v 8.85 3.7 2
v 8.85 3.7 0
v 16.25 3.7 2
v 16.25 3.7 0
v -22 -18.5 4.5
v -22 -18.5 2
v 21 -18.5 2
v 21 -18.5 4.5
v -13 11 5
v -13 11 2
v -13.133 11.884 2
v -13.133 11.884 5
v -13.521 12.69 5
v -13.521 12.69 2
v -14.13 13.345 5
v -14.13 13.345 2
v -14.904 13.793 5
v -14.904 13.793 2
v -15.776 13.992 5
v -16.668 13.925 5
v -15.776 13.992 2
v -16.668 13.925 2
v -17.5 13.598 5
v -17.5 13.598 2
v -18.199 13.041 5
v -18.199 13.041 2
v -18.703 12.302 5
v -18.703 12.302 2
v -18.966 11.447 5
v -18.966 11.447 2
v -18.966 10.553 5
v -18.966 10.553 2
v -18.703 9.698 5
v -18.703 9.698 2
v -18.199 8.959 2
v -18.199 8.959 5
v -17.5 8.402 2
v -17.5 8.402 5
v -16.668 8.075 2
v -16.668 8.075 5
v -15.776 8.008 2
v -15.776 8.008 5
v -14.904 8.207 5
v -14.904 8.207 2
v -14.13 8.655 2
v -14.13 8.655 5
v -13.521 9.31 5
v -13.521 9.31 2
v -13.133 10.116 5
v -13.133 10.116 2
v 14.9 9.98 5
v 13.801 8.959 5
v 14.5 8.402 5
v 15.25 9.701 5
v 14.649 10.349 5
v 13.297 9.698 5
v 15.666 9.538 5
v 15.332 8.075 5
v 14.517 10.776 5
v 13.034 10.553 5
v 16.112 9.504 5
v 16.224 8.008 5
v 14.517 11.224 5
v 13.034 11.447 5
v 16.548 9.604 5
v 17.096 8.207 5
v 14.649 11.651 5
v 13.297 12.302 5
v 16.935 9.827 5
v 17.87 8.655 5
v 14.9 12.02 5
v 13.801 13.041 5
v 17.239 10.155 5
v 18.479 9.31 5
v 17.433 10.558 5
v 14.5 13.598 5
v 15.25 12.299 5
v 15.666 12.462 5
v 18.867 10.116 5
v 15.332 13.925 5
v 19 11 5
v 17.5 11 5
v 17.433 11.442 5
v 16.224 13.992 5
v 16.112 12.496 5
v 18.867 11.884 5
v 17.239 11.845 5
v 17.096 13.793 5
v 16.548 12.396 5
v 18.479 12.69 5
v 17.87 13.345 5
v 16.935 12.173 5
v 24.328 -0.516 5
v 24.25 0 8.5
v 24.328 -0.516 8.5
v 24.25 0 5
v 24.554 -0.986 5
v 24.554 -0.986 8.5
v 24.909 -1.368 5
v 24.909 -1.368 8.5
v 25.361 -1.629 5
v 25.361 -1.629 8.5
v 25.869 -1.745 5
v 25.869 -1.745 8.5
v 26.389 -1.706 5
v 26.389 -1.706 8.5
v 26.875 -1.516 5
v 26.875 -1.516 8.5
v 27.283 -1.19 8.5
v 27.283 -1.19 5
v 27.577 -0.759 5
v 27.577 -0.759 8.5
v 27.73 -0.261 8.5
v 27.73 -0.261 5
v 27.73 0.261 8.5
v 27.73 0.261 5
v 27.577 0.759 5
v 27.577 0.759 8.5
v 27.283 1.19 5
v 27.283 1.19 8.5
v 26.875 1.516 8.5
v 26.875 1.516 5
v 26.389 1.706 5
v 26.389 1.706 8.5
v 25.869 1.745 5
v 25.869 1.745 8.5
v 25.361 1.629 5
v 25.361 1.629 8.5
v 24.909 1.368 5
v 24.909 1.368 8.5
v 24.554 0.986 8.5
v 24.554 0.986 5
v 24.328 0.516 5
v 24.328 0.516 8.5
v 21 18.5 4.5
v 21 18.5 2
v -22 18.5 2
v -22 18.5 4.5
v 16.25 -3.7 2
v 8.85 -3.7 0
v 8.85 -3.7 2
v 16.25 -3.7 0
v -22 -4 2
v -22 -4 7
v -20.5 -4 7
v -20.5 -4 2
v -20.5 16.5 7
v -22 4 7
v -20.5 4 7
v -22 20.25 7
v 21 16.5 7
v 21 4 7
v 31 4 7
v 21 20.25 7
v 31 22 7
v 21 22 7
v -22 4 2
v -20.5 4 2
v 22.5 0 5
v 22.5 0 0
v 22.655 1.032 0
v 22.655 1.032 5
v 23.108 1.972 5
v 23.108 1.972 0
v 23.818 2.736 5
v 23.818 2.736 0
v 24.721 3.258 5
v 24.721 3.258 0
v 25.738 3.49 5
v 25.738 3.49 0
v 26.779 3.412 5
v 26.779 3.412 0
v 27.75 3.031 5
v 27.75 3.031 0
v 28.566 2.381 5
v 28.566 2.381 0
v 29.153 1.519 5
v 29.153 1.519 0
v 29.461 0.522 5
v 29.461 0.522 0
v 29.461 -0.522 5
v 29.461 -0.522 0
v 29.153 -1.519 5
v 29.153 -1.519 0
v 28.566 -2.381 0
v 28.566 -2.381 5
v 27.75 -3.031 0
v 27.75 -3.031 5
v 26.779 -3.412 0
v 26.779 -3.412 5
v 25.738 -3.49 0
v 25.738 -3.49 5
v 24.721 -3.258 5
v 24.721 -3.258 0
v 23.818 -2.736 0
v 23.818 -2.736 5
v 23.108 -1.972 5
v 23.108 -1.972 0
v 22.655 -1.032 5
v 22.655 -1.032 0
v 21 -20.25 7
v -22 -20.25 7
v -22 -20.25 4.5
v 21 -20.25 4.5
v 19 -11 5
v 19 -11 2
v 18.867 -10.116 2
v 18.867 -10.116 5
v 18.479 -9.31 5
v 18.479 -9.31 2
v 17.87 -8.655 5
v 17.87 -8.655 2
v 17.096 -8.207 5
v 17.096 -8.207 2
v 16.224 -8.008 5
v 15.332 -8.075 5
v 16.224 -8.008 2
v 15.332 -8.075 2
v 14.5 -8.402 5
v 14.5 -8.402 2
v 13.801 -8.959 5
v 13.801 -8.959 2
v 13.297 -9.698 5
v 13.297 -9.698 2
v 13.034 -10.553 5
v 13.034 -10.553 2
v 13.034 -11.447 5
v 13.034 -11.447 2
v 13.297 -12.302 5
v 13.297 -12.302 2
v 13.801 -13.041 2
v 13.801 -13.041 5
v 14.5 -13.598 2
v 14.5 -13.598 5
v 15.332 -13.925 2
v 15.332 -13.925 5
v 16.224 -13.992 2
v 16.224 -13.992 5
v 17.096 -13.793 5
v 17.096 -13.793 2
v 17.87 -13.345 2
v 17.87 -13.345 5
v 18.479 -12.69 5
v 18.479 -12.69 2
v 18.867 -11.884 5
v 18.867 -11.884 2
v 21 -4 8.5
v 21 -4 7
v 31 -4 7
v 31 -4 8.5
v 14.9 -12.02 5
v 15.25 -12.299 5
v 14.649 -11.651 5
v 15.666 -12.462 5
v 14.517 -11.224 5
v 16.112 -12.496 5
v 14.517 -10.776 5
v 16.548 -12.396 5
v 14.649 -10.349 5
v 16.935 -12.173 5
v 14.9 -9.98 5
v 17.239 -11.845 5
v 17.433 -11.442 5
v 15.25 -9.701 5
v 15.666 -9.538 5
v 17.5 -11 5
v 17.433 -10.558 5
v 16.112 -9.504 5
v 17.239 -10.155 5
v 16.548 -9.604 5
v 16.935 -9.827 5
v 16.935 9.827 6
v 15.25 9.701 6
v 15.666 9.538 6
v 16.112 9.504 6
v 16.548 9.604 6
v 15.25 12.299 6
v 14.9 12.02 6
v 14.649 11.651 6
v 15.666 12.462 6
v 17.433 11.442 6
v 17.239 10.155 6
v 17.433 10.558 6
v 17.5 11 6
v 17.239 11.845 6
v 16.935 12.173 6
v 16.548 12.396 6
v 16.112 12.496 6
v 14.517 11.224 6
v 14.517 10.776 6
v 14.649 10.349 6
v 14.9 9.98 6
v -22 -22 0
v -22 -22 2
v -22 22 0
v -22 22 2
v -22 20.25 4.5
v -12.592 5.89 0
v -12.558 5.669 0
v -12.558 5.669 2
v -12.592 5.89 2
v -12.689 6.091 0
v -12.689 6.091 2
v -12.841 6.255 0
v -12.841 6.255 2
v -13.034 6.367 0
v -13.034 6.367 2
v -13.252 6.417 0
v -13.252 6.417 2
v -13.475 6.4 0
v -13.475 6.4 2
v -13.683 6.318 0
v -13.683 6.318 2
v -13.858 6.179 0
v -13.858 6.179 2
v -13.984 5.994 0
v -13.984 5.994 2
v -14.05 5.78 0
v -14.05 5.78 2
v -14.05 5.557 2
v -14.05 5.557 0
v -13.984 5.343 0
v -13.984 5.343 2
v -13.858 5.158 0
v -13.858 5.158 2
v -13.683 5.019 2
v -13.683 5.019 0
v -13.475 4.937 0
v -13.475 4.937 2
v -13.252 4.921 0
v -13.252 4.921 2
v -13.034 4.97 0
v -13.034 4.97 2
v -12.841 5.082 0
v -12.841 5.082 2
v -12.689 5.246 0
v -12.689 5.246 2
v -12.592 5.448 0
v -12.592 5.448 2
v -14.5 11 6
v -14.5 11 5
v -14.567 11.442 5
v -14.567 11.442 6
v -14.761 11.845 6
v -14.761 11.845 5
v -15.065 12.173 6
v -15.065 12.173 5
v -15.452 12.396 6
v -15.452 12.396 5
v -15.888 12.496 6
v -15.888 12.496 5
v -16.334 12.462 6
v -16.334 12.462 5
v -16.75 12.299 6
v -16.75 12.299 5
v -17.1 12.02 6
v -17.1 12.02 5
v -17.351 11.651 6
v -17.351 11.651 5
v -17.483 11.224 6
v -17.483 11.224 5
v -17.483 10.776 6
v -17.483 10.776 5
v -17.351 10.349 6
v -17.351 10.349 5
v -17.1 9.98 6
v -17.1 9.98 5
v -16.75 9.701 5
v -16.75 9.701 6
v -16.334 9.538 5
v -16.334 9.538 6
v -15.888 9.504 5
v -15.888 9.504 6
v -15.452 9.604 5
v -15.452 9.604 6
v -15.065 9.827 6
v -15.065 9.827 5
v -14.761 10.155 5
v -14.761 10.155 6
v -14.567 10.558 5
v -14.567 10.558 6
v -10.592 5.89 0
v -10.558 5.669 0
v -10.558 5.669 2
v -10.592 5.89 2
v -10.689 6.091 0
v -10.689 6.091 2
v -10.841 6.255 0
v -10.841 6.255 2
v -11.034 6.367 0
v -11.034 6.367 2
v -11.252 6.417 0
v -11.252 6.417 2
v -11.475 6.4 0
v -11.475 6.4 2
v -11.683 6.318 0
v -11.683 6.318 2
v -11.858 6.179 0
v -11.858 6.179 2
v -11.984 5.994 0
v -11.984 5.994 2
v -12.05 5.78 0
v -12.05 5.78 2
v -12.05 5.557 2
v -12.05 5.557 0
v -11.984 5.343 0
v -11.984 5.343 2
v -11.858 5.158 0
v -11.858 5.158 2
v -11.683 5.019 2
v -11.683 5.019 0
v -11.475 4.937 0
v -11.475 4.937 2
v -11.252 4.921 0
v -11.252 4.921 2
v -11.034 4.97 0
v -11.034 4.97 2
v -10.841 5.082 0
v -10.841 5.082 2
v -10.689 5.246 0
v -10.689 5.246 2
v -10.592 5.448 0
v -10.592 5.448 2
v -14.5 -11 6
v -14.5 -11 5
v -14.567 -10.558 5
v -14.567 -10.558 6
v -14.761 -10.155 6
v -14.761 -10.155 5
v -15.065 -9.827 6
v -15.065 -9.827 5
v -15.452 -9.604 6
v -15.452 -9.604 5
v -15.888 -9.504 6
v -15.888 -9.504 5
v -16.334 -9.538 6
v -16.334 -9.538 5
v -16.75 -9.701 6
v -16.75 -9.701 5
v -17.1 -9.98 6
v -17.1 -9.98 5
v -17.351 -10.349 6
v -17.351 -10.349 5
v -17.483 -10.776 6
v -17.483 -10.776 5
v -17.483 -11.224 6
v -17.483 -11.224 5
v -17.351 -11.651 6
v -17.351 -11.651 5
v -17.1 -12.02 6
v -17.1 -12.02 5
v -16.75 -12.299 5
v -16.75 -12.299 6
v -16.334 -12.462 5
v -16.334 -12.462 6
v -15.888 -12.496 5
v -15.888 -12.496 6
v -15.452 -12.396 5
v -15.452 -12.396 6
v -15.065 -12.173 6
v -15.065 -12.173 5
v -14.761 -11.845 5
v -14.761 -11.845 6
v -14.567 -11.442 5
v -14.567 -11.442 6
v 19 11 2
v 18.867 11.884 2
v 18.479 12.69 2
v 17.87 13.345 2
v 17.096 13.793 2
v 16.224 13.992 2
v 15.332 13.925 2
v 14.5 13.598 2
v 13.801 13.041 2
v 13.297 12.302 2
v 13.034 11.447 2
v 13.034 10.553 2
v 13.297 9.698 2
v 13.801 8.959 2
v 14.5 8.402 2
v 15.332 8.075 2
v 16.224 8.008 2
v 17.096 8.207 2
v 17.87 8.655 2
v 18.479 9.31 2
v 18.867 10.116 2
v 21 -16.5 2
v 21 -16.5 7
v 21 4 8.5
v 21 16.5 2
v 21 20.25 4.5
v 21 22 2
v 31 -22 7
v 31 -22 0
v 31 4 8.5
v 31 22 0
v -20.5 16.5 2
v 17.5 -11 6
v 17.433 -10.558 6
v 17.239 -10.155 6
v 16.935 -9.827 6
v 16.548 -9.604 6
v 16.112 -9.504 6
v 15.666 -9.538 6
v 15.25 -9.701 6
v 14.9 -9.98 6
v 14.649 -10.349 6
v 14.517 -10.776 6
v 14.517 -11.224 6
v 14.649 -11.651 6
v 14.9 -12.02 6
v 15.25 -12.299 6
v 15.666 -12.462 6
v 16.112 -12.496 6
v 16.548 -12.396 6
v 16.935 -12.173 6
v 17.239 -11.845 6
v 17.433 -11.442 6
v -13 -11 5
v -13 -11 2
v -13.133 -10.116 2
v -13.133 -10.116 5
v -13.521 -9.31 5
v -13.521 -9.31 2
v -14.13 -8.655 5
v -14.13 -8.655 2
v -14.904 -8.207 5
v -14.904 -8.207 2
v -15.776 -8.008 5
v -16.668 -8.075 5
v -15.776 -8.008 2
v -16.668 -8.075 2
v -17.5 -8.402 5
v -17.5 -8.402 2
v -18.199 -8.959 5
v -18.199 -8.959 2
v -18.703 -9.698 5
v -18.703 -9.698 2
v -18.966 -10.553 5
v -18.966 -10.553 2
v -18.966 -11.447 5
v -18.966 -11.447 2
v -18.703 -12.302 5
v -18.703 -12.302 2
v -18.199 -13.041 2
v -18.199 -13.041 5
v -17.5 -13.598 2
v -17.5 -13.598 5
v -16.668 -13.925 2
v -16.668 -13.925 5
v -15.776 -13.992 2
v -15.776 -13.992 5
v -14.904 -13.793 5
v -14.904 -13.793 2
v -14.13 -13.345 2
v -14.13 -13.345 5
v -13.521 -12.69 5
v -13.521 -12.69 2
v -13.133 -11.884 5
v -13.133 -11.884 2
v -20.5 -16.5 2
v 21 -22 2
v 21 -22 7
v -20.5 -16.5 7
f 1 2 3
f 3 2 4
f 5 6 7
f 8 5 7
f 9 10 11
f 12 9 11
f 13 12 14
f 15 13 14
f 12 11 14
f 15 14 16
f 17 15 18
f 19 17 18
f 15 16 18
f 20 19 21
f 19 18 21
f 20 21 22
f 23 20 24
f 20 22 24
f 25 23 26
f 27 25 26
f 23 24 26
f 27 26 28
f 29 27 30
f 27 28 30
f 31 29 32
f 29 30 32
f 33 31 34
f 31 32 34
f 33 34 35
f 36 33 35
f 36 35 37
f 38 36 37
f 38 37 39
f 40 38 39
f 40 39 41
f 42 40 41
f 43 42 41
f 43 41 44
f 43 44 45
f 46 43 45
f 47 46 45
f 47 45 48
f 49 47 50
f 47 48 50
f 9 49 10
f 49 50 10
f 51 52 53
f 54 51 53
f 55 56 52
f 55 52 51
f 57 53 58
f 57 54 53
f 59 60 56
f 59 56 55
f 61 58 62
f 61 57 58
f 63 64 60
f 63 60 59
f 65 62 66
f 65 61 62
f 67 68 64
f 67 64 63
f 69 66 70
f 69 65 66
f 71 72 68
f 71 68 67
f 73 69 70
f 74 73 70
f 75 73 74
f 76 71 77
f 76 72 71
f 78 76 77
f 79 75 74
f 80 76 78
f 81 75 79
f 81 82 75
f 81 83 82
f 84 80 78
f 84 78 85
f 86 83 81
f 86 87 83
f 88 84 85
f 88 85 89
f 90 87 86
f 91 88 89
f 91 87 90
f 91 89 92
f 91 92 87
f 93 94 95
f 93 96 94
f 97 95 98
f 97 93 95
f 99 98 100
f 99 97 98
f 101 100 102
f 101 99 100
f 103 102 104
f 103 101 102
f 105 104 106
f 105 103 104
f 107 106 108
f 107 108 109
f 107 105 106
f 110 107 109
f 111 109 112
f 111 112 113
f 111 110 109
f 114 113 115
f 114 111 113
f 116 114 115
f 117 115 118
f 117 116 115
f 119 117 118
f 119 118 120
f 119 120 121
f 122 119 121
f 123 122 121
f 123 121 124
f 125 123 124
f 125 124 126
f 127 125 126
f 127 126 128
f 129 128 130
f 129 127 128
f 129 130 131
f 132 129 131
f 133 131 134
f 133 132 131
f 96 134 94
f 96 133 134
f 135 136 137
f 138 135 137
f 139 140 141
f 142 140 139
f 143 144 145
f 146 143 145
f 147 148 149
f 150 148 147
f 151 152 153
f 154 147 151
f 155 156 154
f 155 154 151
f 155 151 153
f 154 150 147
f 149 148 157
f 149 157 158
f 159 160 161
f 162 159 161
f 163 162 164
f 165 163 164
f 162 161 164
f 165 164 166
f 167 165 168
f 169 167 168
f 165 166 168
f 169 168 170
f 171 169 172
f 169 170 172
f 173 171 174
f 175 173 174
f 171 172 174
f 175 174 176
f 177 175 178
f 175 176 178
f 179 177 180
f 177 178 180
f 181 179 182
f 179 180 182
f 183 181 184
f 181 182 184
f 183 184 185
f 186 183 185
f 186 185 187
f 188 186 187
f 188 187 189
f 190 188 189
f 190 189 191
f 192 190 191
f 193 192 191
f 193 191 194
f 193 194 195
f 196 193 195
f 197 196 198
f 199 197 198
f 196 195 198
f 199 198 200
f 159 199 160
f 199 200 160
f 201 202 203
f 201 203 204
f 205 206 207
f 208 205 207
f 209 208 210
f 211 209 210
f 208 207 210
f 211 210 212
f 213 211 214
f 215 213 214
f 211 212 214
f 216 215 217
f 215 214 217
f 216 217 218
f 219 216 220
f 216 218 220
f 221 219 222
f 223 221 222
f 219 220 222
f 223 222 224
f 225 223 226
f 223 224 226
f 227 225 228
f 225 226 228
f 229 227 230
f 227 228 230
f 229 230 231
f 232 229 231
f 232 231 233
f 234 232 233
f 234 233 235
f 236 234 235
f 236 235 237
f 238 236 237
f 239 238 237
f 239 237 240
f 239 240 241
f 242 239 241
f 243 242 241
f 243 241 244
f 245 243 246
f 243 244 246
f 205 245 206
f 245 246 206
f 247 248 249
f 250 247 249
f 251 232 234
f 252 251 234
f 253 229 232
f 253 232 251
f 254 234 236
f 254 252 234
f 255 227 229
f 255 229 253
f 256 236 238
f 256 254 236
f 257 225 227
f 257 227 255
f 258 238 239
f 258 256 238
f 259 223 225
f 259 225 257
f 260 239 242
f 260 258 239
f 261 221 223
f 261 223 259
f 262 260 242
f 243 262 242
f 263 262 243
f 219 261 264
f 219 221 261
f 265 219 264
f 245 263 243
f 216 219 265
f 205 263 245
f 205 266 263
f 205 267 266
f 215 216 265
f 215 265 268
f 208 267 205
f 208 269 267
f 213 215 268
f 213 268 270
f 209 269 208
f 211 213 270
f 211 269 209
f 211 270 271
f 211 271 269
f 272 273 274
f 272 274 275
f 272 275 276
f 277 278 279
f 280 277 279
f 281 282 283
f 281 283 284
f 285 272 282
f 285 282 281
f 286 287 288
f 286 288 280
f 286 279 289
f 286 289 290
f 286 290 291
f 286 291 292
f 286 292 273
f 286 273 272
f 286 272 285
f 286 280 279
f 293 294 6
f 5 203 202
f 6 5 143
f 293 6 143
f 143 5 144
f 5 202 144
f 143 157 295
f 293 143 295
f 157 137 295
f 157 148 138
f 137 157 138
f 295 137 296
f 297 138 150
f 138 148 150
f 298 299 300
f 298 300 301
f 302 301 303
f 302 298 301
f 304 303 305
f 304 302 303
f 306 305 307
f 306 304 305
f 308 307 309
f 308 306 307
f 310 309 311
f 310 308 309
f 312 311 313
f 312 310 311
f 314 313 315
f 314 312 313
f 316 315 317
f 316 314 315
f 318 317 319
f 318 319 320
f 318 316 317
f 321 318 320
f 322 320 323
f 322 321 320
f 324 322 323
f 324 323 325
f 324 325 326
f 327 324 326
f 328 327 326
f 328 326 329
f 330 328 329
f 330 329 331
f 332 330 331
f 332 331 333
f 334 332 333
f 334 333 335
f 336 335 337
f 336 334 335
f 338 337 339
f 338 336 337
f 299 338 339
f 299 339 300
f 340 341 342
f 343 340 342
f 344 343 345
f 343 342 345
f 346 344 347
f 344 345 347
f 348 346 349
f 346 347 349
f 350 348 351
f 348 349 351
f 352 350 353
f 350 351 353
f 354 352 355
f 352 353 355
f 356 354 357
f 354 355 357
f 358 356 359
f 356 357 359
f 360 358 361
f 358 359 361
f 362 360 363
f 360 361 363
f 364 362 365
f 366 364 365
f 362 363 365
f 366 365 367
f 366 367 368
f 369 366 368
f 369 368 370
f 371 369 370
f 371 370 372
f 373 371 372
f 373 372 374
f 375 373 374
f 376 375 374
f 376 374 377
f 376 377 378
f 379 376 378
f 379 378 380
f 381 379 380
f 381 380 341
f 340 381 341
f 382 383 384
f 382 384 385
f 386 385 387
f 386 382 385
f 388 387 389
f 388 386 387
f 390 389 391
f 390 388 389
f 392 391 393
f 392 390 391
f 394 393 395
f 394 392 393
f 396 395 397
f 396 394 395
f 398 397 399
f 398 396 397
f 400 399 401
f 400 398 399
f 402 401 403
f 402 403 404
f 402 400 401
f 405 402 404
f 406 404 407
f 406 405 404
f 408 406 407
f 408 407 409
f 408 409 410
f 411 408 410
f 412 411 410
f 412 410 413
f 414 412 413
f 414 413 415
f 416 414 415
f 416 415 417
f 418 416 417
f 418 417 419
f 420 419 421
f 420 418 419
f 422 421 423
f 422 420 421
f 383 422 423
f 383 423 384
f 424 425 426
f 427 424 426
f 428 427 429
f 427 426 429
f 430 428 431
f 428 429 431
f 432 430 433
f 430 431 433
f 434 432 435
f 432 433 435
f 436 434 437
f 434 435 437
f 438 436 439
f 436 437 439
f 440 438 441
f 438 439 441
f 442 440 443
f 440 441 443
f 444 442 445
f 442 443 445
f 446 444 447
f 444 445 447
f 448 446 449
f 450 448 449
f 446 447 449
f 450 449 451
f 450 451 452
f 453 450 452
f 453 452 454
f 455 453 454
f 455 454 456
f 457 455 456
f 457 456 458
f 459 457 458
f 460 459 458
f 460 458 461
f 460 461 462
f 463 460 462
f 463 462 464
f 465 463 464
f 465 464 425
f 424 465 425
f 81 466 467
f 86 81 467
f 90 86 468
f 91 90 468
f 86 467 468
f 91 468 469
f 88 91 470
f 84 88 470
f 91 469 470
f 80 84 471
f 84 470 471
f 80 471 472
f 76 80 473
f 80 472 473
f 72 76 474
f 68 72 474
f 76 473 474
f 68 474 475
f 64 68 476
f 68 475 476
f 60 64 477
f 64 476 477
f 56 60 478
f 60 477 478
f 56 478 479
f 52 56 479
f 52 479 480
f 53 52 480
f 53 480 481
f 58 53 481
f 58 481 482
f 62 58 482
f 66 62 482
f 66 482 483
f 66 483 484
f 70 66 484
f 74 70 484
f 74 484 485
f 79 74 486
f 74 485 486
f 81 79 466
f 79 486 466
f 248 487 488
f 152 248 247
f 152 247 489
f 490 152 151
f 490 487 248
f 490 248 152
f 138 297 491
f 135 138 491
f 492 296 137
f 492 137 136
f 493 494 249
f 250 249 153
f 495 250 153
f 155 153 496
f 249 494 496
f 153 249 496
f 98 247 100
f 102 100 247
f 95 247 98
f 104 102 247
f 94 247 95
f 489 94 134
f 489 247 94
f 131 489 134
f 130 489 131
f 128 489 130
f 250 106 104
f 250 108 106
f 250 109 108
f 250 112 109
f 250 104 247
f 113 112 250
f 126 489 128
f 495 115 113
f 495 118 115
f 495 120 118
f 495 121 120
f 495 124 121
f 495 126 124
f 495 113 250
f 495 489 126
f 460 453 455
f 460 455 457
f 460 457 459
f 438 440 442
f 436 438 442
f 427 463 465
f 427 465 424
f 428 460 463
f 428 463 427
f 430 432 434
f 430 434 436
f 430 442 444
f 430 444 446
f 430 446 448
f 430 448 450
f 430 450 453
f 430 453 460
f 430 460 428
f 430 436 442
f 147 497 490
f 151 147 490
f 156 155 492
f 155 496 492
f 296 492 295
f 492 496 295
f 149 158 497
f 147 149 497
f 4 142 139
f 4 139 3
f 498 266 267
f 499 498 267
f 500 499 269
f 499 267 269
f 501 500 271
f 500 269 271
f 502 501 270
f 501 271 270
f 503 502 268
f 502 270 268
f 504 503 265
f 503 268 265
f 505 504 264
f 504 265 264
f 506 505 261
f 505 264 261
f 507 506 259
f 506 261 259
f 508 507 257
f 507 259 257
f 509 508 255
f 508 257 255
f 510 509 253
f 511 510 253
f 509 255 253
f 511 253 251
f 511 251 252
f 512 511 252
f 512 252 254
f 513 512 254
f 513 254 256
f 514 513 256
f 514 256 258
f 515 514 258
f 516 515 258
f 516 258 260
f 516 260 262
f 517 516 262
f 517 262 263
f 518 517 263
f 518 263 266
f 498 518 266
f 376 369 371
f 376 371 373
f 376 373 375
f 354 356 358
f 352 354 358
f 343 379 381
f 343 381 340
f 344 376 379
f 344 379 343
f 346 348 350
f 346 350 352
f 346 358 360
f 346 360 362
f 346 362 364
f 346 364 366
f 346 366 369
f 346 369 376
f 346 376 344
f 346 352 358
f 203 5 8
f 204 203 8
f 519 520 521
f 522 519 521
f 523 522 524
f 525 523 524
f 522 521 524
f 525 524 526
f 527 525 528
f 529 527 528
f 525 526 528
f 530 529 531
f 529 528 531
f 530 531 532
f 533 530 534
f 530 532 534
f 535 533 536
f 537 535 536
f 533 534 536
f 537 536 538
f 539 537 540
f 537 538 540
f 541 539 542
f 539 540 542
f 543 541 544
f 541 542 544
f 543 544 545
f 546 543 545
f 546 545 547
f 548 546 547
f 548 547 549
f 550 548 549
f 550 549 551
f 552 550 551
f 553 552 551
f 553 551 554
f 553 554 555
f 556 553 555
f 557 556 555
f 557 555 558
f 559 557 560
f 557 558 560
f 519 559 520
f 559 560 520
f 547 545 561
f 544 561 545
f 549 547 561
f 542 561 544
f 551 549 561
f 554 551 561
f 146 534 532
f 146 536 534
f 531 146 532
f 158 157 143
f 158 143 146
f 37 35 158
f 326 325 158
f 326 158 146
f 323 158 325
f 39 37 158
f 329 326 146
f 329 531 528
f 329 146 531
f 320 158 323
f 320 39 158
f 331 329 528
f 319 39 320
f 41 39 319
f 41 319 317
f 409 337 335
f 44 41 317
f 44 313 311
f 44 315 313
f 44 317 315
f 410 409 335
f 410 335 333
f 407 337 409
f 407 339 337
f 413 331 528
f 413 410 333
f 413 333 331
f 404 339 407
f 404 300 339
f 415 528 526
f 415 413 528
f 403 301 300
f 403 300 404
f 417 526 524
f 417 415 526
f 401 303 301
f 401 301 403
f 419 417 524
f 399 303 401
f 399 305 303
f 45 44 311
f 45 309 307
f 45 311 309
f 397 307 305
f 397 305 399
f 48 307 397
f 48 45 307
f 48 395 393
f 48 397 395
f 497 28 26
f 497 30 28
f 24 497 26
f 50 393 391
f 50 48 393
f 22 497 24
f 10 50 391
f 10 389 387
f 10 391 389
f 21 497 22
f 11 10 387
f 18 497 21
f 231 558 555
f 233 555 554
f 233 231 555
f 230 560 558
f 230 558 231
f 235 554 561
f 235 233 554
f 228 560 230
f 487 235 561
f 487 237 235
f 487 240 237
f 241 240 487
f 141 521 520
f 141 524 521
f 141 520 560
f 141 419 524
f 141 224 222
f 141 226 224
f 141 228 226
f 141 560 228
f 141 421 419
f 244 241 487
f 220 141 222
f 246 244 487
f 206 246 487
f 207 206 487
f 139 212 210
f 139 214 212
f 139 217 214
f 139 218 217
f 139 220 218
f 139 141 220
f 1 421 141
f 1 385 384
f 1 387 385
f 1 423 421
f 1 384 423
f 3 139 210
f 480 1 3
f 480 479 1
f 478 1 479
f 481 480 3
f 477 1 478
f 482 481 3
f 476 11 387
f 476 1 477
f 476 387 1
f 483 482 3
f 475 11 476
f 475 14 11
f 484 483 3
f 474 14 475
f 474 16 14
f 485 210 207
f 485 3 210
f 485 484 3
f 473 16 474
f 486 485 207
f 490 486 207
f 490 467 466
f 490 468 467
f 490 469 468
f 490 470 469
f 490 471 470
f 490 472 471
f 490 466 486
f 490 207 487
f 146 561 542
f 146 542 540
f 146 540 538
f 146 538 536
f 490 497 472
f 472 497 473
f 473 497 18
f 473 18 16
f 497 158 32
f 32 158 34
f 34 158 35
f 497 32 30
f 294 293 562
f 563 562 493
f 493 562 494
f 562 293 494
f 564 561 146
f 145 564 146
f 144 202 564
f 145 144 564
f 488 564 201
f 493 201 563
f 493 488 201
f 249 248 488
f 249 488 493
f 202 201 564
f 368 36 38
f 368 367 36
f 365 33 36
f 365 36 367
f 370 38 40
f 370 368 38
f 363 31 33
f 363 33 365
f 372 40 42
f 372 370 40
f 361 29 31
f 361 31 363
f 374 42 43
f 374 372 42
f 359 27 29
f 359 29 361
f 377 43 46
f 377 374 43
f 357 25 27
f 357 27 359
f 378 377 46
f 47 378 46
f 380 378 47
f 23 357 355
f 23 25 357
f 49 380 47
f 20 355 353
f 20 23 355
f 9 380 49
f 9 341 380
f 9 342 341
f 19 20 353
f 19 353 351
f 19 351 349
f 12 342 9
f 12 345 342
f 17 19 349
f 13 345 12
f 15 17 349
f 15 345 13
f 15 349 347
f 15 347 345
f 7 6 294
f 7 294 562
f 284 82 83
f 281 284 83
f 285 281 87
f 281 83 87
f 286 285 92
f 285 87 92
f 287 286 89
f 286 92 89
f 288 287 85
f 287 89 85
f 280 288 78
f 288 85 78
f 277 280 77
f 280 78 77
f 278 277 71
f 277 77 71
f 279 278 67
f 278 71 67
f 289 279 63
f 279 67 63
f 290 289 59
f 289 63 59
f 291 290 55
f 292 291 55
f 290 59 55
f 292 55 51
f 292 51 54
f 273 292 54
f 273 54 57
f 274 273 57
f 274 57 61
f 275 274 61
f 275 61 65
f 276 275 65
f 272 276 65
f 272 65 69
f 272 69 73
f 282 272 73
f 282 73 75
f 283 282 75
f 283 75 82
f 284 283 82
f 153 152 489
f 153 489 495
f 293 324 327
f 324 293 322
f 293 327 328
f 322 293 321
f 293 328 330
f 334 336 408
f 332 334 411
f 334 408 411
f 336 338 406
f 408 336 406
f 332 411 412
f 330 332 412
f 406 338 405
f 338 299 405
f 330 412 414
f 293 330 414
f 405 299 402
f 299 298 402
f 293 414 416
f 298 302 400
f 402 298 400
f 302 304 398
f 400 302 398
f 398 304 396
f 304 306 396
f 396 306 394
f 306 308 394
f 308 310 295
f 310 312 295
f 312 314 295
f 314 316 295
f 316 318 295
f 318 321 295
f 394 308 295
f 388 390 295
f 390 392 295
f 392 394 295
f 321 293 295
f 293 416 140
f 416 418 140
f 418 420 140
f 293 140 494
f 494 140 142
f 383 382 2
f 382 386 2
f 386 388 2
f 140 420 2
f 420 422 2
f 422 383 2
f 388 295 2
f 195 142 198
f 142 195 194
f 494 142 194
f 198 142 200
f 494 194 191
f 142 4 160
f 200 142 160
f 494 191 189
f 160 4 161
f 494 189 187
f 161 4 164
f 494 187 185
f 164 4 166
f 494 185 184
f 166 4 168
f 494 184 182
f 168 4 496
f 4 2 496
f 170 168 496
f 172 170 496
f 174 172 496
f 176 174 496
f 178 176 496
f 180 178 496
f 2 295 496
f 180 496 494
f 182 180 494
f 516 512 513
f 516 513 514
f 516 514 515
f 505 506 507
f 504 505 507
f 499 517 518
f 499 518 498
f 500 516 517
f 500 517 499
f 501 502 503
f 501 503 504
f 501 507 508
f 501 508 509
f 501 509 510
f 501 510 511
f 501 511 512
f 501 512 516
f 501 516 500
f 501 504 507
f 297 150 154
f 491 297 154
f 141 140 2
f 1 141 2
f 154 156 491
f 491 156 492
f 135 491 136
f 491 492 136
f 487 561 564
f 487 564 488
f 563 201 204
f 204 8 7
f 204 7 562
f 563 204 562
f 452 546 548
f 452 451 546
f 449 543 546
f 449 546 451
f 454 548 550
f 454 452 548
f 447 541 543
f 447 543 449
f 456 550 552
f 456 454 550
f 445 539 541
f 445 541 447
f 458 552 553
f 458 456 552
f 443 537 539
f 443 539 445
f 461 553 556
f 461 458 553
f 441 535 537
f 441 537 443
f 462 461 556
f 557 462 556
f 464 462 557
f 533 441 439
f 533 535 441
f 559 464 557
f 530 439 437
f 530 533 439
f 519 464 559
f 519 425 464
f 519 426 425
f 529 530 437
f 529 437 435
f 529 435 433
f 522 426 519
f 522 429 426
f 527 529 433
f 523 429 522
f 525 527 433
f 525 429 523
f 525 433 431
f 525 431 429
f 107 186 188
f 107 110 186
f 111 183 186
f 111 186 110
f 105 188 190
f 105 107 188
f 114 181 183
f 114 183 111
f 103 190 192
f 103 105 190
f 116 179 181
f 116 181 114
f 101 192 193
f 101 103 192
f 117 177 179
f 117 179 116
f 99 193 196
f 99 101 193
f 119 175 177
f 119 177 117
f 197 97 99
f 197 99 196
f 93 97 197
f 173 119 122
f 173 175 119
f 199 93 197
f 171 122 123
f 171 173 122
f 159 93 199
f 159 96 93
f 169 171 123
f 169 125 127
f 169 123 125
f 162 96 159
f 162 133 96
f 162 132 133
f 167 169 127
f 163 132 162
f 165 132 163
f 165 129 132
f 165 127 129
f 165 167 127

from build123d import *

# Parameters (mm, degrees)
CROQUIS1_W              = 53
CROQUIS1_H              = 44
CROQUIS1_R              = 0.75
CROQUIS1_W_2            = 7.4
CROQUIS1_H_2            = 7.4
SALIENTE_EXTRUIR1_DEPTH = 2
CROQUIS4_R              = 1.5
SALIENTE_EXTRUIR3_DEPTH = 4
CORTAR_EXTRUIR1_REACH   = 40.484
CROQUIS5_R              = 1.75
CROQUIS6_R              = 1.75
CROQUIS6_W              = 41.5
CROQUIS6_H              = 33
SALIENTE_EXTRUIR4_DEPTH = 5
CROQUIS7_W              = 43
CROQUIS7_H              = 1.75
SALIENTE_EXTRUIR5_DEPTH = 2.5
CROQUIS8_W              = 1.5
CROQUIS8_H              = 8
CORTAR_EXTRUIR3_DEPTH   = 5
CROQUIS9_R              = 3.5
CORTAR_EXTRUIR4_DEPTH   = 5
CROQUIS10_R             = 3
SALIENTE_EXTRUIR6_DEPTH = 3
CROQUIS12_W             = 10
CROQUIS12_H             = 8
CROQUIS12_R             = 1.75
SALIENTE_EXTRUIR7_DEPTH = 1.5


with BuildPart() as part:
    # Croquis1 → Saliente-Extruir1 (new body)
    with BuildSketch(Plane.XY):
        with Locations((4.5, 0)):
            Rectangle(CROQUIS1_W, CROQUIS1_H)
        with Locations((-13.3084, 5.6686)):
            Circle(CROQUIS1_R, mode=Mode.SUBTRACT)
        with Locations((-11.3084, 5.6686)):
            Circle(CROQUIS1_R, mode=Mode.SUBTRACT)
        with Locations((12.55, 0)):
            Rectangle(CROQUIS1_W_2, CROQUIS1_H_2, mode=Mode.SUBTRACT)
    extrude(amount=SALIENTE_EXTRUIR1_DEPTH)

    # Croquis4 → Saliente-Extruir3 (add)
    with BuildSketch(Plane.XY.offset(2)):
        with Locations((-16, -11)):
            Circle(CROQUIS4_R)
        with Locations((16, -11)):
            Circle(CROQUIS4_R)
        with Locations((16, 11)):
            Circle(CROQUIS4_R)
        with Locations((-16, 11)):
            Circle(CROQUIS4_R)
    extrude(amount=SALIENTE_EXTRUIR3_DEPTH)

    # Croquis5 → Cortar-Extruir1 (cut, up to next)
    with BuildSketch(Plane(origin=(0, 0, 0), x_dir=(-1, 0, 0), z_dir=(0, 0, -1)), mode=Mode.PRIVATE) as cortar_extruir1_sk1:
        with Locations((-26, 0)):
            Circle(CROQUIS5_R)
    cortar_extruir1_tool1 = extrude(cortar_extruir1_sk1.sketch, amount=-CORTAR_EXTRUIR1_REACH, mode=Mode.PRIVATE) & part.part
    add(cortar_extruir1_tool1.solids().sort_by_distance((26, 0, 0))[0], mode=Mode.SUBTRACT)

    # Croquis6 → Saliente-Extruir4 (add)
    with BuildSketch(Plane.XY.offset(2)):
        Polygon((-22, -18.5), (21, -18.5), (21, -22), (31, -22), (31, 22), (21, 22), (21, 18.5), (-22, 18.5), align=None)
        with Locations(Location((26, 0, 0), (0, 0, 180))):
            Circle(CROQUIS6_R, mode=Mode.SUBTRACT)
        with Locations((0.25, 0)):
            Rectangle(CROQUIS6_W, CROQUIS6_H, mode=Mode.SUBTRACT)
    extrude(amount=SALIENTE_EXTRUIR4_DEPTH)

    # Croquis7 → Saliente-Extruir5 (add)
    with BuildSketch(Plane.XY.offset(7)):
        with Locations((-0.5, 19.375)):
            Rectangle(CROQUIS7_W, CROQUIS7_H)
        with Locations((-0.5, -19.375)):
            Rectangle(CROQUIS7_W, CROQUIS7_H)
    extrude(amount=-SALIENTE_EXTRUIR5_DEPTH)

    # Croquis8 → Cortar-Extruir3 (cut)
    with BuildSketch(Plane.XY.offset(7)):
        with Locations((-21.25, 0)):
            Rectangle(CROQUIS8_W, CROQUIS8_H)
    extrude(amount=-CORTAR_EXTRUIR3_DEPTH, mode=Mode.SUBTRACT)

    # Croquis9 → Cortar-Extruir4 (cut)
    with BuildSketch(Plane(origin=(0, 0, 0), x_dir=(-1, 0, 0), z_dir=(0, 0, -1))):
        with Locations((-26, 0)):
            Circle(CROQUIS9_R)
    extrude(amount=-CORTAR_EXTRUIR4_DEPTH, mode=Mode.SUBTRACT)

    # Croquis10 → Saliente-Extruir6 (add)
    with BuildSketch(Plane.XY.offset(2)):
        with Locations((-16, 11)):
            Circle(CROQUIS10_R)
        with Locations((16, 11)):
            Circle(CROQUIS10_R)
        with Locations((16, -11)):
            Circle(CROQUIS10_R)
        with Locations((-16, -11)):
            Circle(CROQUIS10_R)
    extrude(amount=SALIENTE_EXTRUIR6_DEPTH)

    # Croquis12 → Saliente-Extruir7 (add)
    with BuildSketch(Plane.XY.offset(7)):
        with Locations((26, 0)):
            Rectangle(CROQUIS12_W, CROQUIS12_H)
        with Locations(Location((26, 0, 0), (0, 0, 180))):
            Circle(CROQUIS12_R, mode=Mode.SUBTRACT)
    extrude(amount=SALIENTE_EXTRUIR7_DEPTH)


solid = part.part
